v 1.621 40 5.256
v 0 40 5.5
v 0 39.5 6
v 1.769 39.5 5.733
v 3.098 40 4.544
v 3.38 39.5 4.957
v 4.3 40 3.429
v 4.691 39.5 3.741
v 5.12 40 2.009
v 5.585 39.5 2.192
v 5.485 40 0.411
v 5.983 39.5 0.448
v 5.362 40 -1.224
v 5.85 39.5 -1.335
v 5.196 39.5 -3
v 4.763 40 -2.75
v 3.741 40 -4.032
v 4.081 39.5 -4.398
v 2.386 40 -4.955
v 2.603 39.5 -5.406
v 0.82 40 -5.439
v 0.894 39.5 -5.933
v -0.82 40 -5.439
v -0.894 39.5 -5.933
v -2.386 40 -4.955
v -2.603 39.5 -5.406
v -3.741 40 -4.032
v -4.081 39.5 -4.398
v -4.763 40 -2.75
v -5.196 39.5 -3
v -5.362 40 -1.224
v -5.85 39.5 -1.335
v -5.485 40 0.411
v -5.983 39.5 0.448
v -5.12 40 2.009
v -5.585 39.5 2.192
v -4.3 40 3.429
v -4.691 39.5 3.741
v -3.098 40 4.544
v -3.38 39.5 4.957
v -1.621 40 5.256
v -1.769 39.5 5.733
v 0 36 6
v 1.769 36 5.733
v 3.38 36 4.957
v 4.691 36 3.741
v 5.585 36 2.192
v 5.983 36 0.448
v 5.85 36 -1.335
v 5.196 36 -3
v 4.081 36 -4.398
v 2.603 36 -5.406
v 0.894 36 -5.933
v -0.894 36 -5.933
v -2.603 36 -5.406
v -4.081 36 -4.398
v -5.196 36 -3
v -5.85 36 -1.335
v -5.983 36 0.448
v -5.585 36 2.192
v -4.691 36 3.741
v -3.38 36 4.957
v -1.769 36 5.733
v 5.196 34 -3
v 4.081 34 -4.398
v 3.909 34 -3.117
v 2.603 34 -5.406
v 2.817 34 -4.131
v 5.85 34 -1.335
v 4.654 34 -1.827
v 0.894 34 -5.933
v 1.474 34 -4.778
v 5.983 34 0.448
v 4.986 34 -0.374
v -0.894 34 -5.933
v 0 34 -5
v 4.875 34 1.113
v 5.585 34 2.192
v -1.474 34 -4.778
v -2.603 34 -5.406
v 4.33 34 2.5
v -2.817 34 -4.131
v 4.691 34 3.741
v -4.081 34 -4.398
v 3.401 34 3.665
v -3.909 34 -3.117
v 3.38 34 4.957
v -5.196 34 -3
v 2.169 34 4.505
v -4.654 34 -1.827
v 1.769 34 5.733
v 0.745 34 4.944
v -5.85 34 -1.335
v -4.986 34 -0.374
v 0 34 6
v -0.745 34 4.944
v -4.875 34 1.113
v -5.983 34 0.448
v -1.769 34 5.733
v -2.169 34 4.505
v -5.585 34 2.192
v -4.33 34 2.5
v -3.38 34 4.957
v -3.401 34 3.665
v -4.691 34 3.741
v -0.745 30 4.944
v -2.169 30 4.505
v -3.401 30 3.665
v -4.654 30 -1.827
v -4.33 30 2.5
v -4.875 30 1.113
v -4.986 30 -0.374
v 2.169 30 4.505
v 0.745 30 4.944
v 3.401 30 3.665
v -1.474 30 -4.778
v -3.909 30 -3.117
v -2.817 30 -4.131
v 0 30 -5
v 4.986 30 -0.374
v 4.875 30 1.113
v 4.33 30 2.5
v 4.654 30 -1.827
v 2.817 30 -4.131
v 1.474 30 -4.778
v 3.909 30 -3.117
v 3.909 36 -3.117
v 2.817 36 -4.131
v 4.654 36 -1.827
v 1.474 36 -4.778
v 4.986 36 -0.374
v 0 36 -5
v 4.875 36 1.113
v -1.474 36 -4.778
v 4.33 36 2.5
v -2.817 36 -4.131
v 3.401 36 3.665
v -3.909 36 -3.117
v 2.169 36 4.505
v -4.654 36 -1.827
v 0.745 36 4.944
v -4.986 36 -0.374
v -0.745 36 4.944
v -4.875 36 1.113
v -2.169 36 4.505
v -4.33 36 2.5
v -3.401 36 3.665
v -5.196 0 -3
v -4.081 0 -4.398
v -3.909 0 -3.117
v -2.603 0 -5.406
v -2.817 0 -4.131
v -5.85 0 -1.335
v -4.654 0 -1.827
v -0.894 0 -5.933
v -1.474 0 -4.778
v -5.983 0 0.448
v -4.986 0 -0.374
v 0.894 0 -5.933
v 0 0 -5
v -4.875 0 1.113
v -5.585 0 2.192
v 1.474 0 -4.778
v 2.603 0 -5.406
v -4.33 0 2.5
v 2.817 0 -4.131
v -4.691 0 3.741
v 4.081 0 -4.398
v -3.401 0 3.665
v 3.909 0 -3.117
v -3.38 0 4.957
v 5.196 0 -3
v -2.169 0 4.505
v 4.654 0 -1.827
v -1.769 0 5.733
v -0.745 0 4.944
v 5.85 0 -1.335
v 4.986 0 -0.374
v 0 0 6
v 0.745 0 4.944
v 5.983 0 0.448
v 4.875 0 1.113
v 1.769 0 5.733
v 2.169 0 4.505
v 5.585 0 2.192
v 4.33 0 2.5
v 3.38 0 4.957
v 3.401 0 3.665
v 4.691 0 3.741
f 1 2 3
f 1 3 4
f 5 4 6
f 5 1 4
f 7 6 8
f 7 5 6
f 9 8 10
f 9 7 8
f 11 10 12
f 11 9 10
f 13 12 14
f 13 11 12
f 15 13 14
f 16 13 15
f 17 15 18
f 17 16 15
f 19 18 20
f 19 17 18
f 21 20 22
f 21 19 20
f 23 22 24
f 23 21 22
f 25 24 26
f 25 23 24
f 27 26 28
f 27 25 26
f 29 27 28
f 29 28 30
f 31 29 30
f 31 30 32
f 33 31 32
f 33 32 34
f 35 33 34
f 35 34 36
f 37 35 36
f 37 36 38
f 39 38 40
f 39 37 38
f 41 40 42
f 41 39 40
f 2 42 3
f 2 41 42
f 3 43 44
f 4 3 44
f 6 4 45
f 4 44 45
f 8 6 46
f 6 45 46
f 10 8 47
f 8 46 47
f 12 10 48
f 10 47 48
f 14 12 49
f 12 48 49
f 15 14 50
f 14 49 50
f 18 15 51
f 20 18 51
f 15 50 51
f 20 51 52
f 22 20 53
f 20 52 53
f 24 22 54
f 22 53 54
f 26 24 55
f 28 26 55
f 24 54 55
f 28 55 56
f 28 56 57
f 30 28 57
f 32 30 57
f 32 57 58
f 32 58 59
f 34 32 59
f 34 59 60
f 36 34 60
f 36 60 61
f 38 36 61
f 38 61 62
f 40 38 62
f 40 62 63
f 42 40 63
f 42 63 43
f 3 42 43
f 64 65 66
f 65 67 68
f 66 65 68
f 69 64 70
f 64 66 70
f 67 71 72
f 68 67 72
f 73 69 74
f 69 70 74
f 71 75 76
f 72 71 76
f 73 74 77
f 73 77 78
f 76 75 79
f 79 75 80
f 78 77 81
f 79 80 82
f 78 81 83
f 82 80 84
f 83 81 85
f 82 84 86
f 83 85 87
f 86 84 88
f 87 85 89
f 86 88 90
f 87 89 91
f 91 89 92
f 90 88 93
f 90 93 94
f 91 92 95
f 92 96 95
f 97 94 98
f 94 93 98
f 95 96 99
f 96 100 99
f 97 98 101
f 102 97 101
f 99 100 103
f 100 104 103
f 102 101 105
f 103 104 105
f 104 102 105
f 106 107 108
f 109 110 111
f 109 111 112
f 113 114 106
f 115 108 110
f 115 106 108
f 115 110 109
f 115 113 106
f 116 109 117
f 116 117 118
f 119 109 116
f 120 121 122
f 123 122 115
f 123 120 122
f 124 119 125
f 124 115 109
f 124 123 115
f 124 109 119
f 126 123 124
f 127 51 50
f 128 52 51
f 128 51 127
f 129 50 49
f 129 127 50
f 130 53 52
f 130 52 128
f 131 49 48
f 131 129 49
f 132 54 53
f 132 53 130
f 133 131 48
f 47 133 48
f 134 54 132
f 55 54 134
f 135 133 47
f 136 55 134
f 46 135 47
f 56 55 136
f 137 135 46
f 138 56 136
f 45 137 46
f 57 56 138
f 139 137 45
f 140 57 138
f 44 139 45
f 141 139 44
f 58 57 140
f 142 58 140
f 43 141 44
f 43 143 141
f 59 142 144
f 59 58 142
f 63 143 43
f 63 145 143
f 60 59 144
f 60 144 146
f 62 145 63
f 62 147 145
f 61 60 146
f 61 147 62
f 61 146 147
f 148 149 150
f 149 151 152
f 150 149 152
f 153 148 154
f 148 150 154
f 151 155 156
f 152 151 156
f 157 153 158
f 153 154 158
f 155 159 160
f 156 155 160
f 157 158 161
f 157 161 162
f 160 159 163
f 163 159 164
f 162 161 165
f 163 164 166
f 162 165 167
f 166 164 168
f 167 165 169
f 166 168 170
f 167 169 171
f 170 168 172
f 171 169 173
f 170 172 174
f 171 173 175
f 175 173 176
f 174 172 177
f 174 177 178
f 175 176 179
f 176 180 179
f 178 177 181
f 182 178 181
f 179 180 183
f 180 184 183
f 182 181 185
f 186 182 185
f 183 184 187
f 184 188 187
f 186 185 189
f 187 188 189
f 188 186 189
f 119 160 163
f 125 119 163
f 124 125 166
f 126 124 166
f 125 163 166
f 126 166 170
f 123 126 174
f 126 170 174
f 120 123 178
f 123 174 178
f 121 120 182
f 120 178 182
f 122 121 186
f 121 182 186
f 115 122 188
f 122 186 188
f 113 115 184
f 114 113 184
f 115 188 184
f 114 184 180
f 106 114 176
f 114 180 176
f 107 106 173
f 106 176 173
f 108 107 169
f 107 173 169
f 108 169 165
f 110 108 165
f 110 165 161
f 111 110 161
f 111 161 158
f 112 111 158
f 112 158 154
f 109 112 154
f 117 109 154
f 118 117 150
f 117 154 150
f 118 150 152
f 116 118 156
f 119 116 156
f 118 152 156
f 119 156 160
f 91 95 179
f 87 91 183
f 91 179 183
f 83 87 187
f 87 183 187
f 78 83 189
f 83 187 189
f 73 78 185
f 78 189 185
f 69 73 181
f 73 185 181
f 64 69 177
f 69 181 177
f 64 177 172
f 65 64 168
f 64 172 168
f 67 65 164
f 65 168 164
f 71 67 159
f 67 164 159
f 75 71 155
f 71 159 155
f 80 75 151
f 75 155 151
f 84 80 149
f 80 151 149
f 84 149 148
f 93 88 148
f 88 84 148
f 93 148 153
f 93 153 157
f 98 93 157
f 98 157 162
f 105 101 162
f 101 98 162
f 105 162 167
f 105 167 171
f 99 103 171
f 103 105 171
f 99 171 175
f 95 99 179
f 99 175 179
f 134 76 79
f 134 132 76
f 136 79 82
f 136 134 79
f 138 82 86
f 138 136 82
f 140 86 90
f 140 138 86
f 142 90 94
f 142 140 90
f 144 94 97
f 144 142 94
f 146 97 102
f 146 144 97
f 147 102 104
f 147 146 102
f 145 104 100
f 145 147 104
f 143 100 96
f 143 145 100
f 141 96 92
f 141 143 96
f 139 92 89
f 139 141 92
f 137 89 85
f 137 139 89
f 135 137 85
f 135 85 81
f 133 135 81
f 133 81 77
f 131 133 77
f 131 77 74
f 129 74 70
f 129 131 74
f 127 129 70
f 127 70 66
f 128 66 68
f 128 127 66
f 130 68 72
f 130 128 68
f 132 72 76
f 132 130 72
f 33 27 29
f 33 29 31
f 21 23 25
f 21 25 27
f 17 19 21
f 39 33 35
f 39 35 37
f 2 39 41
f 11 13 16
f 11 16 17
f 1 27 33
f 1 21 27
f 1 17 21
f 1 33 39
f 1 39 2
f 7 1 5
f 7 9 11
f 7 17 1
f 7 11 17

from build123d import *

# Parameters (mm, degrees)
ESBO_O1_R             = 6
EXTRUS_O1_DEPTH       = 40
ESBO_O2_R             = 5
CORTE_EXTRUS_O1_DEPTH = 30
CHANFRO1_SIZE         = 0.5
ESBO_O3_W             = 3
ESBO_O3_H             = 2


with BuildPart() as part:
    # Esboço1 → Extrusão1 (new body)
    with BuildSketch(Plane(origin=(0, 0, 0), x_dir=(1, 0, 0), z_dir=(0, 1, 0))):
        with Locations(Location((0, 0, 0), (0, 0, 270))):  # turned: the seam where the file's is
            Circle(ESBO_O1_R)
    extrude(amount=EXTRUS_O1_DEPTH)

    # Esboço2 → Corte-extrusão1 (cut)
    with BuildSketch(Plane.XZ):
        with Locations(Location((0, 0, 0), (0, 0, 270))):  # turned: the seam where the file's is
            Circle(ESBO_O2_R)
    extrude(amount=-CORTE_EXTRUS_O1_DEPTH, mode=Mode.SUBTRACT)

    # Chanfro1
    chanfro1_edges = [part.edges().sort_by_distance(p)[0] for p in [
        (0, 40, -6),
    ]]
    chamfer(chanfro1_edges, length=CHANFRO1_SIZE)

    # Esboço3 → Corte-Revolução3 (revolve, cut)
    with BuildSketch(Plane.XY, mode=Mode.PRIVATE) as corte_revolu_o3_sk:
        with Locations((6.5, 35)):
            Rectangle(ESBO_O3_W, ESBO_O3_H)
    revolve(corte_revolu_o3_sk.sketch.rotate(Axis((0, 0, 0), (0, 1, 0)), 90), axis=Axis((0, 0, 0), (0, 1, 0)), mode=Mode.SUBTRACT)  # turned: the seam where the file's is


solid = part.part
